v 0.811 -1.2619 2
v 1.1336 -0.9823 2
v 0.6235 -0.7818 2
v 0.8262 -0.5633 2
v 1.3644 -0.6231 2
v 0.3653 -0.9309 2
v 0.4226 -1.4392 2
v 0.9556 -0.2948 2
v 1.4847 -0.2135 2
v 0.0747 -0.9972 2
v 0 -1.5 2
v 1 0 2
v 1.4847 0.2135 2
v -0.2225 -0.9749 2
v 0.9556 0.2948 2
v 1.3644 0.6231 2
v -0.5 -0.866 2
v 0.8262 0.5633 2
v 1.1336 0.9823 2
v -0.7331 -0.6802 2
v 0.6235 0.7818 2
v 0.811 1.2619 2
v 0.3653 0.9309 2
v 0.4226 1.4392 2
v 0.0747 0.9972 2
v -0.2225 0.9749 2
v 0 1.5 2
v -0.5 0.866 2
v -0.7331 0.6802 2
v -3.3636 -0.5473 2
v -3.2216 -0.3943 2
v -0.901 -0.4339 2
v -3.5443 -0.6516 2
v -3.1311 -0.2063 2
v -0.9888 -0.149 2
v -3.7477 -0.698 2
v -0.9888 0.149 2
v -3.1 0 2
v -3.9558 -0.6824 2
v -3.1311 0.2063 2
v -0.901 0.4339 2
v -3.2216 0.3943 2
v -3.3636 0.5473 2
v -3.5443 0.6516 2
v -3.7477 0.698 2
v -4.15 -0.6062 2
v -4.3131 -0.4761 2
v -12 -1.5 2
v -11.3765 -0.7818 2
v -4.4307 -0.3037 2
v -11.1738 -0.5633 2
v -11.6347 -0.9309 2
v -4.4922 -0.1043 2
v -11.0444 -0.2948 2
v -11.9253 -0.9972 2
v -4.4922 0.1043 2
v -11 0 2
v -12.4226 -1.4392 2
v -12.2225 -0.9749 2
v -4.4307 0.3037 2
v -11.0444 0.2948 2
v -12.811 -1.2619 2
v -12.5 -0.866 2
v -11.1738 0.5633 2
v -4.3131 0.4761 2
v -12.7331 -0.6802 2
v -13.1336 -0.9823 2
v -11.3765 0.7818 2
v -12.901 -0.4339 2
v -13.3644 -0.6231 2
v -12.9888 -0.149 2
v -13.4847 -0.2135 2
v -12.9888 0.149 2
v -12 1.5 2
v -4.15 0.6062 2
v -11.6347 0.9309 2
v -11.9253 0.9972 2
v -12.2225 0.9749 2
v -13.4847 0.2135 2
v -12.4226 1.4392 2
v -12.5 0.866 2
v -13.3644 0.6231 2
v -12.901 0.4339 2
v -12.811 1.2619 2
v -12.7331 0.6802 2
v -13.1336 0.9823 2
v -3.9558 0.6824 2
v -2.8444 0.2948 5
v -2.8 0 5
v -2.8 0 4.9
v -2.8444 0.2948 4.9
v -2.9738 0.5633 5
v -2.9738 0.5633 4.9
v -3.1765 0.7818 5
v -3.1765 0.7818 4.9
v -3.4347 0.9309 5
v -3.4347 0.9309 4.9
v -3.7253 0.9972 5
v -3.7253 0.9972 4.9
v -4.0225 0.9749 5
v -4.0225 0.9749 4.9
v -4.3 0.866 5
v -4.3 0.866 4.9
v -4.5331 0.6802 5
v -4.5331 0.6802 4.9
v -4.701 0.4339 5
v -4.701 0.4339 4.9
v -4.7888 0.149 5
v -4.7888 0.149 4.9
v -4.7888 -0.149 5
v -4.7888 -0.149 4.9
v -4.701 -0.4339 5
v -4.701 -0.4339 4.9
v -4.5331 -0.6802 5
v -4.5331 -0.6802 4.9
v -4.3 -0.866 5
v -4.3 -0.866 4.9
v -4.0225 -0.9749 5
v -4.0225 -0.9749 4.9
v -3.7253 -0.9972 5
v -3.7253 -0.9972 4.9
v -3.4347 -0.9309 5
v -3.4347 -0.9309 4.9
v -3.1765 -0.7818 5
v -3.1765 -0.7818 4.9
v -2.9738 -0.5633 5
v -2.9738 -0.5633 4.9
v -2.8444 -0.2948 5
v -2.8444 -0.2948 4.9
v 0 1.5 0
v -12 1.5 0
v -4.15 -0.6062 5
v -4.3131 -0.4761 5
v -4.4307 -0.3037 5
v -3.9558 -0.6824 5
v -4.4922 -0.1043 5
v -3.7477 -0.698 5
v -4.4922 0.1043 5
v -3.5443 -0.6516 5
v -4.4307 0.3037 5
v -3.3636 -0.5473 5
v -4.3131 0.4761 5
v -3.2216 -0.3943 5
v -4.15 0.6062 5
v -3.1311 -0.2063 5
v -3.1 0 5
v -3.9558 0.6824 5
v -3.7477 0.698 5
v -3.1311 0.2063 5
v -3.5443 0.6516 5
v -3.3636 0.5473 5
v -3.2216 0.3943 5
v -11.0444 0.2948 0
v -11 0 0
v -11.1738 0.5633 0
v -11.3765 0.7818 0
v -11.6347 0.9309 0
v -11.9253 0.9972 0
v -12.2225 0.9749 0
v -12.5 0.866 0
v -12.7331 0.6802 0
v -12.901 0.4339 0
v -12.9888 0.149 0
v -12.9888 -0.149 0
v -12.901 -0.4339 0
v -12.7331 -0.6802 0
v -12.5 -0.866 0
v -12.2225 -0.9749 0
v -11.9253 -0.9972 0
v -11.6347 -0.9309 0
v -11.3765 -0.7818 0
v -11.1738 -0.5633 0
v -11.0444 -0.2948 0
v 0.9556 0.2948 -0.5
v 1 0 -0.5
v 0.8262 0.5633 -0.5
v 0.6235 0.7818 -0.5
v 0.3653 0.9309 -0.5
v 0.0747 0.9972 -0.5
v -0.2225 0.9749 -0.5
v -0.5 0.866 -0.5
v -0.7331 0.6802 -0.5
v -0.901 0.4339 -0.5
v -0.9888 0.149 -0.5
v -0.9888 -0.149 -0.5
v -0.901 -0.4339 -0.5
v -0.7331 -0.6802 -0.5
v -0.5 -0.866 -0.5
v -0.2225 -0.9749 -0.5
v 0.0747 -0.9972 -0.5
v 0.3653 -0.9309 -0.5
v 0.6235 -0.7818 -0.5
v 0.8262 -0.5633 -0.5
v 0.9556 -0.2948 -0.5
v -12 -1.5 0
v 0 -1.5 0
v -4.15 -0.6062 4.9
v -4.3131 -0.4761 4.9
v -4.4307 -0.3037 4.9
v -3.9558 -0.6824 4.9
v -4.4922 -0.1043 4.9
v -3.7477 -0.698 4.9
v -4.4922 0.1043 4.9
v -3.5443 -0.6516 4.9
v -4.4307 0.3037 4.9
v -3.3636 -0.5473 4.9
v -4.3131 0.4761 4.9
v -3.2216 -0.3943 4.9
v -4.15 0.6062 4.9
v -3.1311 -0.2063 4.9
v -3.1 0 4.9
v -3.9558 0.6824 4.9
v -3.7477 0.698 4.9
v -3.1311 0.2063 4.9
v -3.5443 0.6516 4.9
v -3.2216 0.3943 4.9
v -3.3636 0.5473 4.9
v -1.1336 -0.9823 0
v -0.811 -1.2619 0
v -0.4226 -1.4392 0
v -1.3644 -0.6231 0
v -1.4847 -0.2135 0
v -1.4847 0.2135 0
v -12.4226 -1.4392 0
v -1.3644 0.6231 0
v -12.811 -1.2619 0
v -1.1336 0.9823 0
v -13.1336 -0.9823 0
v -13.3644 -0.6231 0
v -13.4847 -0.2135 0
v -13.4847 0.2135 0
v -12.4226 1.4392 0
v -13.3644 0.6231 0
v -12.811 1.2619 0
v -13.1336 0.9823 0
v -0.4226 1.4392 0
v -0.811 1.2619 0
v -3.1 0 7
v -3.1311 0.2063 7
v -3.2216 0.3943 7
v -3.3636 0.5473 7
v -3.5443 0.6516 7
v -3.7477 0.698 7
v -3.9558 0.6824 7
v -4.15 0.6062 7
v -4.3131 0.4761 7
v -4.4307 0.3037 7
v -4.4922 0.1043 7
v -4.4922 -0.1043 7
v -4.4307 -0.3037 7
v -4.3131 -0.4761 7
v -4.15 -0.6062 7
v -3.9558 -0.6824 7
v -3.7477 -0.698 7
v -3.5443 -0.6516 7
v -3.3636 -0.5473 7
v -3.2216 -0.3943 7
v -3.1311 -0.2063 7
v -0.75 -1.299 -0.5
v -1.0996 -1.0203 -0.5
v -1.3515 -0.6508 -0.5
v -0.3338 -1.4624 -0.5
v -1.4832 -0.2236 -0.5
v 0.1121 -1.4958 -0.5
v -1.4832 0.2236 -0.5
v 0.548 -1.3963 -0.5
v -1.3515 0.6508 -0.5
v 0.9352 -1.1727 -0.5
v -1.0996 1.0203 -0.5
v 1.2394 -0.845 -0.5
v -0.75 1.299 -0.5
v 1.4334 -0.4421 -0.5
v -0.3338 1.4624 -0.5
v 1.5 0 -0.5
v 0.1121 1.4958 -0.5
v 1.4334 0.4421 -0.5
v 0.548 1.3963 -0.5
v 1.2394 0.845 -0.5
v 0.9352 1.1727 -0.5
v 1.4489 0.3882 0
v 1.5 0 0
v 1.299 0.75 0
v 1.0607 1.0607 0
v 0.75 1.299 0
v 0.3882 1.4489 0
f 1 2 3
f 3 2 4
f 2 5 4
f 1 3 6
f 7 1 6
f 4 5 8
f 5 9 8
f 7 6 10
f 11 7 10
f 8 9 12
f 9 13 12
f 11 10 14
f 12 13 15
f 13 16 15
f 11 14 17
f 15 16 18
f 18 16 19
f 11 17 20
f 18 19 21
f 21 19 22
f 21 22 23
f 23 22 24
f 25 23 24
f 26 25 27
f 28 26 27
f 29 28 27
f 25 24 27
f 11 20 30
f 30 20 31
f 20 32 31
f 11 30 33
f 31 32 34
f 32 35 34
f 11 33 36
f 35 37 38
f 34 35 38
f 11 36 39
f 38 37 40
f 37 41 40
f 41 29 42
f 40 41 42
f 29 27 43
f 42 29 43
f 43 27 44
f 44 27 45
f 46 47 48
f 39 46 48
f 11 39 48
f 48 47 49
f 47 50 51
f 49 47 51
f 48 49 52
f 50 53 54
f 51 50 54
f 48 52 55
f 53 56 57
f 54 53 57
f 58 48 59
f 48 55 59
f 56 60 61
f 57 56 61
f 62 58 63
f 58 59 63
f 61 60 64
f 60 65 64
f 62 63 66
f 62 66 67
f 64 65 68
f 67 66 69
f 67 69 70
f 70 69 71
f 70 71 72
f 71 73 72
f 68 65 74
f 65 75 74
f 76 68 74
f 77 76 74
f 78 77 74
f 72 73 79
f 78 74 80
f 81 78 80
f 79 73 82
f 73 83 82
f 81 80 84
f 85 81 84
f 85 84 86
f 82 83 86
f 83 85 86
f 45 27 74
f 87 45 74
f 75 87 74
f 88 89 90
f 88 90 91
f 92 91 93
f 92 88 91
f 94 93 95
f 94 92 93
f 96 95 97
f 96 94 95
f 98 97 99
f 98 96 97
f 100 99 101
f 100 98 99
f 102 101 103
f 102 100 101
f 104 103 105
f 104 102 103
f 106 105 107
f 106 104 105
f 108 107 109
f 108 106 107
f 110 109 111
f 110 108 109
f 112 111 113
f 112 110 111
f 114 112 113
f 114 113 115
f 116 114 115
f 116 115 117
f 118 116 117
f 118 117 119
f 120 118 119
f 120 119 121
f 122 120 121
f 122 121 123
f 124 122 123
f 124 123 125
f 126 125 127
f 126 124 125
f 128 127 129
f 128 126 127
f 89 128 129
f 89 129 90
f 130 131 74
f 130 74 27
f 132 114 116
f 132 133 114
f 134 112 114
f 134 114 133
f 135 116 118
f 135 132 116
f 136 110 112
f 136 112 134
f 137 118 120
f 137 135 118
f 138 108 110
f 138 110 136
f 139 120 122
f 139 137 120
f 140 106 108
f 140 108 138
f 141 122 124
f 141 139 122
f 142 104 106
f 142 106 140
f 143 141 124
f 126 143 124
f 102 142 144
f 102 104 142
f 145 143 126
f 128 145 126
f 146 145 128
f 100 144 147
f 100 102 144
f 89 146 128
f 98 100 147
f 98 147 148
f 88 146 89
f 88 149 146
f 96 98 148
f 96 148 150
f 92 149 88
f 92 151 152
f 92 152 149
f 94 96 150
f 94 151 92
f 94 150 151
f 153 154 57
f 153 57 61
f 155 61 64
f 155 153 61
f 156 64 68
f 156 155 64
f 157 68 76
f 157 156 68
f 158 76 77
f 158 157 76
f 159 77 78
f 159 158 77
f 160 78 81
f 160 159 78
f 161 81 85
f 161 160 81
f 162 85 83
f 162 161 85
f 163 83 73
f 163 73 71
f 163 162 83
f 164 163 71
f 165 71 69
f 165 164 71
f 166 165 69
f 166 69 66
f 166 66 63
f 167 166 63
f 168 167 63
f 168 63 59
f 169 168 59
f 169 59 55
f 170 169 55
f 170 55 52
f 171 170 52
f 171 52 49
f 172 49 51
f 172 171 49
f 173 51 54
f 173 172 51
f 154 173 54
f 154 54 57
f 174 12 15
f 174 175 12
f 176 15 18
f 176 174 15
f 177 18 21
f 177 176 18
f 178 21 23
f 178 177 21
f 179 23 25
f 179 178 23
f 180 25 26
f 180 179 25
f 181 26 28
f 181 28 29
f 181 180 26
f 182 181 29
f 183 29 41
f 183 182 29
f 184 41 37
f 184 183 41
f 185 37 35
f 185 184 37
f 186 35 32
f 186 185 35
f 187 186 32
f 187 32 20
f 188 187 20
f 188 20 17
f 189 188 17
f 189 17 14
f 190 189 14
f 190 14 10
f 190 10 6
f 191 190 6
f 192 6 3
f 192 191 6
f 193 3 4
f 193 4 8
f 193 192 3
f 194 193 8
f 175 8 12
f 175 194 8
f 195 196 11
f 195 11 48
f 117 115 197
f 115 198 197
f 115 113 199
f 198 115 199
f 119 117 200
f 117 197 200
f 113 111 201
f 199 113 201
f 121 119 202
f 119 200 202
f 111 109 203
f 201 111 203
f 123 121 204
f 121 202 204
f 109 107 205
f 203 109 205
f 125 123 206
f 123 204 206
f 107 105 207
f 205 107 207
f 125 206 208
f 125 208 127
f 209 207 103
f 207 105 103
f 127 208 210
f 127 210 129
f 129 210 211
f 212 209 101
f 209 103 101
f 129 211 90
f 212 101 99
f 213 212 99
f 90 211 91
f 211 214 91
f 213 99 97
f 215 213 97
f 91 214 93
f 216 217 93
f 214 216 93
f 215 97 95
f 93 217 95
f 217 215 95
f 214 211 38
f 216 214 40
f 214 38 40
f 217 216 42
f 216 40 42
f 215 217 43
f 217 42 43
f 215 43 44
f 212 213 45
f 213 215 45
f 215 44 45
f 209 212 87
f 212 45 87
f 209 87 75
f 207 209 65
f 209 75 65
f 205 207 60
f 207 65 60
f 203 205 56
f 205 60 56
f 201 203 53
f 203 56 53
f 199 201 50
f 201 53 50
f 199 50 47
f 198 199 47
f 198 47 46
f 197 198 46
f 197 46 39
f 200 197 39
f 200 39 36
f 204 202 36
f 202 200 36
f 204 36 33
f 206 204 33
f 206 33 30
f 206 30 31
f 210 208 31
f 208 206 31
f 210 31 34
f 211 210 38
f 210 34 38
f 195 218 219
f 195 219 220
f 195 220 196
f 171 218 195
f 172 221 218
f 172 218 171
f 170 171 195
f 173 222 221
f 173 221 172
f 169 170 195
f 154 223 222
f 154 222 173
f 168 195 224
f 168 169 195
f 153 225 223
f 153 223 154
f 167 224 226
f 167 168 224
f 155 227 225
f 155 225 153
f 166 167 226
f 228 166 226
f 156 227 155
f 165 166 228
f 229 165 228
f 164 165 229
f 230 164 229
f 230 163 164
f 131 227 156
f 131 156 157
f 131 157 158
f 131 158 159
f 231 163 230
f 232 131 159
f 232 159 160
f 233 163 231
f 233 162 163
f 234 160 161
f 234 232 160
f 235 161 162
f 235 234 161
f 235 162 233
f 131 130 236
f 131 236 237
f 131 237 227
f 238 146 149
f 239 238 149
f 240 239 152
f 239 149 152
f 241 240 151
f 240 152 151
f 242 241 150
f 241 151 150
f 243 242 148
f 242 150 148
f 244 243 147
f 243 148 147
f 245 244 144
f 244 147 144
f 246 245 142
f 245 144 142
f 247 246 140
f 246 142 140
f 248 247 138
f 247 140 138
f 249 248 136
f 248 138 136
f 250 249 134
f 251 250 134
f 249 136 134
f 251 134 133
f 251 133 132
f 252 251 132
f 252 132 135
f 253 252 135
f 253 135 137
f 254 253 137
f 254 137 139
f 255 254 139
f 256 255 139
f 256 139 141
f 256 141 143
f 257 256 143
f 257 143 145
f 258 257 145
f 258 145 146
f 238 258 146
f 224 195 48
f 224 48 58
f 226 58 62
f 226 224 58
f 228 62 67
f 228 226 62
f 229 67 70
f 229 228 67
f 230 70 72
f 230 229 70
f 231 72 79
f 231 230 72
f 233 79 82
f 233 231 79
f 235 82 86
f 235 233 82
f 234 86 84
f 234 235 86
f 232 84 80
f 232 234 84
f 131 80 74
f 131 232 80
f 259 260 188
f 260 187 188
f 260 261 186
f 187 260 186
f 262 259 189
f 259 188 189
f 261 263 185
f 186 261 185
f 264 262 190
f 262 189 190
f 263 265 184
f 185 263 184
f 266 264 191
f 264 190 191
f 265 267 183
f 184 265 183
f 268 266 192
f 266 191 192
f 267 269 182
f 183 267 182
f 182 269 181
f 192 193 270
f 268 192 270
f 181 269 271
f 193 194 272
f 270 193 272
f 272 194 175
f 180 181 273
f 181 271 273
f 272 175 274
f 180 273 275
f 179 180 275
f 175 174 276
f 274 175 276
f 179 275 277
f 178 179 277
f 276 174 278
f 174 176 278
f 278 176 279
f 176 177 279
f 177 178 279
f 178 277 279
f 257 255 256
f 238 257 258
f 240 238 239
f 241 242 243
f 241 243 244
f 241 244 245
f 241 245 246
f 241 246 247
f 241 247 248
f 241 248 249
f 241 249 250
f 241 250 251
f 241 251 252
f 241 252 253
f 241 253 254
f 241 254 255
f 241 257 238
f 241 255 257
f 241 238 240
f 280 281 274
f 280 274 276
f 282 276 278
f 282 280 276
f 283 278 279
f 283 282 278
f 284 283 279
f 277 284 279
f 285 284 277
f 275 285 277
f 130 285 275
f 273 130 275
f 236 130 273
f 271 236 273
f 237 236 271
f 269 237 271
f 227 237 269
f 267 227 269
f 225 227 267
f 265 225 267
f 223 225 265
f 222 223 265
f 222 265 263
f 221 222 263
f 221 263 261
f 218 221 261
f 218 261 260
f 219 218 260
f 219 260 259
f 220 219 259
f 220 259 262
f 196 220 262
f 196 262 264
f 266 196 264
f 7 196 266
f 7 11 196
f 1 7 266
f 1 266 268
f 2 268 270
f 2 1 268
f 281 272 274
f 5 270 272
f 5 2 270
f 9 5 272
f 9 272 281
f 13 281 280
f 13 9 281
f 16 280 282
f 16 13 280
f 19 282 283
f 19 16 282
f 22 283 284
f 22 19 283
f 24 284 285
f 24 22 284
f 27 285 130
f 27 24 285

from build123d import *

# Parameters (mm, degrees)
SKETCH_1_R      = 1
EXTRUDE_1_DEPTH = 2
SKETCH_2_R      = 1.5
SKETCH_2_R_2    = 1
EXTRUDE_2_DEPTH = 0.5
SKETCH_3_R      = 0.7
EXTRUDE_3_DEPTH = 5
EXTRUDE_START   = -2
SKETCH_4_R      = 1
EXTRUDE_4_DEPTH = 0.1


with BuildPart() as part:
    # 草图1 → 凸台-拉伸1 (new body)
    with BuildSketch(Plane.XY):
        with BuildLine():
            Line((0, -1.5), (-12, -1.5))
            ThreePointArc((-12, -1.5), (-13.5, 0), (-12, 1.5))
            Line((-12, 1.5), (0, 1.5))
            ThreePointArc((0, 1.5), (1.5, 0), (0, -1.5))
        make_face()
        with Locations((-12, 0)):
            Circle(SKETCH_1_R, mode=Mode.SUBTRACT)
        Circle(SKETCH_1_R, mode=Mode.SUBTRACT)
    extrude(amount=EXTRUDE_1_DEPTH)

    # 草图2 → 凸台-拉伸2 (add)
    with BuildSketch(Plane.XY):
        Circle(SKETCH_2_R)
        Circle(SKETCH_2_R_2, mode=Mode.SUBTRACT)
    extrude(amount=-EXTRUDE_2_DEPTH)

    # 草图3 → 凸台-拉伸3 (add)
    with BuildSketch(Plane.XY.offset(2)):
        with Locations((-3.8, 0)):
            Circle(SKETCH_3_R)
    extrude(amount=EXTRUDE_3_DEPTH)

    # 草图4 → 凸台-拉伸4 (add)
    with BuildSketch(Plane.XY.offset(7).offset(EXTRUDE_START)):
        with Locations((-3.8, 0)):
            Circle(SKETCH_4_R)
    extrude(amount=-EXTRUDE_4_DEPTH)


solid = part.part
